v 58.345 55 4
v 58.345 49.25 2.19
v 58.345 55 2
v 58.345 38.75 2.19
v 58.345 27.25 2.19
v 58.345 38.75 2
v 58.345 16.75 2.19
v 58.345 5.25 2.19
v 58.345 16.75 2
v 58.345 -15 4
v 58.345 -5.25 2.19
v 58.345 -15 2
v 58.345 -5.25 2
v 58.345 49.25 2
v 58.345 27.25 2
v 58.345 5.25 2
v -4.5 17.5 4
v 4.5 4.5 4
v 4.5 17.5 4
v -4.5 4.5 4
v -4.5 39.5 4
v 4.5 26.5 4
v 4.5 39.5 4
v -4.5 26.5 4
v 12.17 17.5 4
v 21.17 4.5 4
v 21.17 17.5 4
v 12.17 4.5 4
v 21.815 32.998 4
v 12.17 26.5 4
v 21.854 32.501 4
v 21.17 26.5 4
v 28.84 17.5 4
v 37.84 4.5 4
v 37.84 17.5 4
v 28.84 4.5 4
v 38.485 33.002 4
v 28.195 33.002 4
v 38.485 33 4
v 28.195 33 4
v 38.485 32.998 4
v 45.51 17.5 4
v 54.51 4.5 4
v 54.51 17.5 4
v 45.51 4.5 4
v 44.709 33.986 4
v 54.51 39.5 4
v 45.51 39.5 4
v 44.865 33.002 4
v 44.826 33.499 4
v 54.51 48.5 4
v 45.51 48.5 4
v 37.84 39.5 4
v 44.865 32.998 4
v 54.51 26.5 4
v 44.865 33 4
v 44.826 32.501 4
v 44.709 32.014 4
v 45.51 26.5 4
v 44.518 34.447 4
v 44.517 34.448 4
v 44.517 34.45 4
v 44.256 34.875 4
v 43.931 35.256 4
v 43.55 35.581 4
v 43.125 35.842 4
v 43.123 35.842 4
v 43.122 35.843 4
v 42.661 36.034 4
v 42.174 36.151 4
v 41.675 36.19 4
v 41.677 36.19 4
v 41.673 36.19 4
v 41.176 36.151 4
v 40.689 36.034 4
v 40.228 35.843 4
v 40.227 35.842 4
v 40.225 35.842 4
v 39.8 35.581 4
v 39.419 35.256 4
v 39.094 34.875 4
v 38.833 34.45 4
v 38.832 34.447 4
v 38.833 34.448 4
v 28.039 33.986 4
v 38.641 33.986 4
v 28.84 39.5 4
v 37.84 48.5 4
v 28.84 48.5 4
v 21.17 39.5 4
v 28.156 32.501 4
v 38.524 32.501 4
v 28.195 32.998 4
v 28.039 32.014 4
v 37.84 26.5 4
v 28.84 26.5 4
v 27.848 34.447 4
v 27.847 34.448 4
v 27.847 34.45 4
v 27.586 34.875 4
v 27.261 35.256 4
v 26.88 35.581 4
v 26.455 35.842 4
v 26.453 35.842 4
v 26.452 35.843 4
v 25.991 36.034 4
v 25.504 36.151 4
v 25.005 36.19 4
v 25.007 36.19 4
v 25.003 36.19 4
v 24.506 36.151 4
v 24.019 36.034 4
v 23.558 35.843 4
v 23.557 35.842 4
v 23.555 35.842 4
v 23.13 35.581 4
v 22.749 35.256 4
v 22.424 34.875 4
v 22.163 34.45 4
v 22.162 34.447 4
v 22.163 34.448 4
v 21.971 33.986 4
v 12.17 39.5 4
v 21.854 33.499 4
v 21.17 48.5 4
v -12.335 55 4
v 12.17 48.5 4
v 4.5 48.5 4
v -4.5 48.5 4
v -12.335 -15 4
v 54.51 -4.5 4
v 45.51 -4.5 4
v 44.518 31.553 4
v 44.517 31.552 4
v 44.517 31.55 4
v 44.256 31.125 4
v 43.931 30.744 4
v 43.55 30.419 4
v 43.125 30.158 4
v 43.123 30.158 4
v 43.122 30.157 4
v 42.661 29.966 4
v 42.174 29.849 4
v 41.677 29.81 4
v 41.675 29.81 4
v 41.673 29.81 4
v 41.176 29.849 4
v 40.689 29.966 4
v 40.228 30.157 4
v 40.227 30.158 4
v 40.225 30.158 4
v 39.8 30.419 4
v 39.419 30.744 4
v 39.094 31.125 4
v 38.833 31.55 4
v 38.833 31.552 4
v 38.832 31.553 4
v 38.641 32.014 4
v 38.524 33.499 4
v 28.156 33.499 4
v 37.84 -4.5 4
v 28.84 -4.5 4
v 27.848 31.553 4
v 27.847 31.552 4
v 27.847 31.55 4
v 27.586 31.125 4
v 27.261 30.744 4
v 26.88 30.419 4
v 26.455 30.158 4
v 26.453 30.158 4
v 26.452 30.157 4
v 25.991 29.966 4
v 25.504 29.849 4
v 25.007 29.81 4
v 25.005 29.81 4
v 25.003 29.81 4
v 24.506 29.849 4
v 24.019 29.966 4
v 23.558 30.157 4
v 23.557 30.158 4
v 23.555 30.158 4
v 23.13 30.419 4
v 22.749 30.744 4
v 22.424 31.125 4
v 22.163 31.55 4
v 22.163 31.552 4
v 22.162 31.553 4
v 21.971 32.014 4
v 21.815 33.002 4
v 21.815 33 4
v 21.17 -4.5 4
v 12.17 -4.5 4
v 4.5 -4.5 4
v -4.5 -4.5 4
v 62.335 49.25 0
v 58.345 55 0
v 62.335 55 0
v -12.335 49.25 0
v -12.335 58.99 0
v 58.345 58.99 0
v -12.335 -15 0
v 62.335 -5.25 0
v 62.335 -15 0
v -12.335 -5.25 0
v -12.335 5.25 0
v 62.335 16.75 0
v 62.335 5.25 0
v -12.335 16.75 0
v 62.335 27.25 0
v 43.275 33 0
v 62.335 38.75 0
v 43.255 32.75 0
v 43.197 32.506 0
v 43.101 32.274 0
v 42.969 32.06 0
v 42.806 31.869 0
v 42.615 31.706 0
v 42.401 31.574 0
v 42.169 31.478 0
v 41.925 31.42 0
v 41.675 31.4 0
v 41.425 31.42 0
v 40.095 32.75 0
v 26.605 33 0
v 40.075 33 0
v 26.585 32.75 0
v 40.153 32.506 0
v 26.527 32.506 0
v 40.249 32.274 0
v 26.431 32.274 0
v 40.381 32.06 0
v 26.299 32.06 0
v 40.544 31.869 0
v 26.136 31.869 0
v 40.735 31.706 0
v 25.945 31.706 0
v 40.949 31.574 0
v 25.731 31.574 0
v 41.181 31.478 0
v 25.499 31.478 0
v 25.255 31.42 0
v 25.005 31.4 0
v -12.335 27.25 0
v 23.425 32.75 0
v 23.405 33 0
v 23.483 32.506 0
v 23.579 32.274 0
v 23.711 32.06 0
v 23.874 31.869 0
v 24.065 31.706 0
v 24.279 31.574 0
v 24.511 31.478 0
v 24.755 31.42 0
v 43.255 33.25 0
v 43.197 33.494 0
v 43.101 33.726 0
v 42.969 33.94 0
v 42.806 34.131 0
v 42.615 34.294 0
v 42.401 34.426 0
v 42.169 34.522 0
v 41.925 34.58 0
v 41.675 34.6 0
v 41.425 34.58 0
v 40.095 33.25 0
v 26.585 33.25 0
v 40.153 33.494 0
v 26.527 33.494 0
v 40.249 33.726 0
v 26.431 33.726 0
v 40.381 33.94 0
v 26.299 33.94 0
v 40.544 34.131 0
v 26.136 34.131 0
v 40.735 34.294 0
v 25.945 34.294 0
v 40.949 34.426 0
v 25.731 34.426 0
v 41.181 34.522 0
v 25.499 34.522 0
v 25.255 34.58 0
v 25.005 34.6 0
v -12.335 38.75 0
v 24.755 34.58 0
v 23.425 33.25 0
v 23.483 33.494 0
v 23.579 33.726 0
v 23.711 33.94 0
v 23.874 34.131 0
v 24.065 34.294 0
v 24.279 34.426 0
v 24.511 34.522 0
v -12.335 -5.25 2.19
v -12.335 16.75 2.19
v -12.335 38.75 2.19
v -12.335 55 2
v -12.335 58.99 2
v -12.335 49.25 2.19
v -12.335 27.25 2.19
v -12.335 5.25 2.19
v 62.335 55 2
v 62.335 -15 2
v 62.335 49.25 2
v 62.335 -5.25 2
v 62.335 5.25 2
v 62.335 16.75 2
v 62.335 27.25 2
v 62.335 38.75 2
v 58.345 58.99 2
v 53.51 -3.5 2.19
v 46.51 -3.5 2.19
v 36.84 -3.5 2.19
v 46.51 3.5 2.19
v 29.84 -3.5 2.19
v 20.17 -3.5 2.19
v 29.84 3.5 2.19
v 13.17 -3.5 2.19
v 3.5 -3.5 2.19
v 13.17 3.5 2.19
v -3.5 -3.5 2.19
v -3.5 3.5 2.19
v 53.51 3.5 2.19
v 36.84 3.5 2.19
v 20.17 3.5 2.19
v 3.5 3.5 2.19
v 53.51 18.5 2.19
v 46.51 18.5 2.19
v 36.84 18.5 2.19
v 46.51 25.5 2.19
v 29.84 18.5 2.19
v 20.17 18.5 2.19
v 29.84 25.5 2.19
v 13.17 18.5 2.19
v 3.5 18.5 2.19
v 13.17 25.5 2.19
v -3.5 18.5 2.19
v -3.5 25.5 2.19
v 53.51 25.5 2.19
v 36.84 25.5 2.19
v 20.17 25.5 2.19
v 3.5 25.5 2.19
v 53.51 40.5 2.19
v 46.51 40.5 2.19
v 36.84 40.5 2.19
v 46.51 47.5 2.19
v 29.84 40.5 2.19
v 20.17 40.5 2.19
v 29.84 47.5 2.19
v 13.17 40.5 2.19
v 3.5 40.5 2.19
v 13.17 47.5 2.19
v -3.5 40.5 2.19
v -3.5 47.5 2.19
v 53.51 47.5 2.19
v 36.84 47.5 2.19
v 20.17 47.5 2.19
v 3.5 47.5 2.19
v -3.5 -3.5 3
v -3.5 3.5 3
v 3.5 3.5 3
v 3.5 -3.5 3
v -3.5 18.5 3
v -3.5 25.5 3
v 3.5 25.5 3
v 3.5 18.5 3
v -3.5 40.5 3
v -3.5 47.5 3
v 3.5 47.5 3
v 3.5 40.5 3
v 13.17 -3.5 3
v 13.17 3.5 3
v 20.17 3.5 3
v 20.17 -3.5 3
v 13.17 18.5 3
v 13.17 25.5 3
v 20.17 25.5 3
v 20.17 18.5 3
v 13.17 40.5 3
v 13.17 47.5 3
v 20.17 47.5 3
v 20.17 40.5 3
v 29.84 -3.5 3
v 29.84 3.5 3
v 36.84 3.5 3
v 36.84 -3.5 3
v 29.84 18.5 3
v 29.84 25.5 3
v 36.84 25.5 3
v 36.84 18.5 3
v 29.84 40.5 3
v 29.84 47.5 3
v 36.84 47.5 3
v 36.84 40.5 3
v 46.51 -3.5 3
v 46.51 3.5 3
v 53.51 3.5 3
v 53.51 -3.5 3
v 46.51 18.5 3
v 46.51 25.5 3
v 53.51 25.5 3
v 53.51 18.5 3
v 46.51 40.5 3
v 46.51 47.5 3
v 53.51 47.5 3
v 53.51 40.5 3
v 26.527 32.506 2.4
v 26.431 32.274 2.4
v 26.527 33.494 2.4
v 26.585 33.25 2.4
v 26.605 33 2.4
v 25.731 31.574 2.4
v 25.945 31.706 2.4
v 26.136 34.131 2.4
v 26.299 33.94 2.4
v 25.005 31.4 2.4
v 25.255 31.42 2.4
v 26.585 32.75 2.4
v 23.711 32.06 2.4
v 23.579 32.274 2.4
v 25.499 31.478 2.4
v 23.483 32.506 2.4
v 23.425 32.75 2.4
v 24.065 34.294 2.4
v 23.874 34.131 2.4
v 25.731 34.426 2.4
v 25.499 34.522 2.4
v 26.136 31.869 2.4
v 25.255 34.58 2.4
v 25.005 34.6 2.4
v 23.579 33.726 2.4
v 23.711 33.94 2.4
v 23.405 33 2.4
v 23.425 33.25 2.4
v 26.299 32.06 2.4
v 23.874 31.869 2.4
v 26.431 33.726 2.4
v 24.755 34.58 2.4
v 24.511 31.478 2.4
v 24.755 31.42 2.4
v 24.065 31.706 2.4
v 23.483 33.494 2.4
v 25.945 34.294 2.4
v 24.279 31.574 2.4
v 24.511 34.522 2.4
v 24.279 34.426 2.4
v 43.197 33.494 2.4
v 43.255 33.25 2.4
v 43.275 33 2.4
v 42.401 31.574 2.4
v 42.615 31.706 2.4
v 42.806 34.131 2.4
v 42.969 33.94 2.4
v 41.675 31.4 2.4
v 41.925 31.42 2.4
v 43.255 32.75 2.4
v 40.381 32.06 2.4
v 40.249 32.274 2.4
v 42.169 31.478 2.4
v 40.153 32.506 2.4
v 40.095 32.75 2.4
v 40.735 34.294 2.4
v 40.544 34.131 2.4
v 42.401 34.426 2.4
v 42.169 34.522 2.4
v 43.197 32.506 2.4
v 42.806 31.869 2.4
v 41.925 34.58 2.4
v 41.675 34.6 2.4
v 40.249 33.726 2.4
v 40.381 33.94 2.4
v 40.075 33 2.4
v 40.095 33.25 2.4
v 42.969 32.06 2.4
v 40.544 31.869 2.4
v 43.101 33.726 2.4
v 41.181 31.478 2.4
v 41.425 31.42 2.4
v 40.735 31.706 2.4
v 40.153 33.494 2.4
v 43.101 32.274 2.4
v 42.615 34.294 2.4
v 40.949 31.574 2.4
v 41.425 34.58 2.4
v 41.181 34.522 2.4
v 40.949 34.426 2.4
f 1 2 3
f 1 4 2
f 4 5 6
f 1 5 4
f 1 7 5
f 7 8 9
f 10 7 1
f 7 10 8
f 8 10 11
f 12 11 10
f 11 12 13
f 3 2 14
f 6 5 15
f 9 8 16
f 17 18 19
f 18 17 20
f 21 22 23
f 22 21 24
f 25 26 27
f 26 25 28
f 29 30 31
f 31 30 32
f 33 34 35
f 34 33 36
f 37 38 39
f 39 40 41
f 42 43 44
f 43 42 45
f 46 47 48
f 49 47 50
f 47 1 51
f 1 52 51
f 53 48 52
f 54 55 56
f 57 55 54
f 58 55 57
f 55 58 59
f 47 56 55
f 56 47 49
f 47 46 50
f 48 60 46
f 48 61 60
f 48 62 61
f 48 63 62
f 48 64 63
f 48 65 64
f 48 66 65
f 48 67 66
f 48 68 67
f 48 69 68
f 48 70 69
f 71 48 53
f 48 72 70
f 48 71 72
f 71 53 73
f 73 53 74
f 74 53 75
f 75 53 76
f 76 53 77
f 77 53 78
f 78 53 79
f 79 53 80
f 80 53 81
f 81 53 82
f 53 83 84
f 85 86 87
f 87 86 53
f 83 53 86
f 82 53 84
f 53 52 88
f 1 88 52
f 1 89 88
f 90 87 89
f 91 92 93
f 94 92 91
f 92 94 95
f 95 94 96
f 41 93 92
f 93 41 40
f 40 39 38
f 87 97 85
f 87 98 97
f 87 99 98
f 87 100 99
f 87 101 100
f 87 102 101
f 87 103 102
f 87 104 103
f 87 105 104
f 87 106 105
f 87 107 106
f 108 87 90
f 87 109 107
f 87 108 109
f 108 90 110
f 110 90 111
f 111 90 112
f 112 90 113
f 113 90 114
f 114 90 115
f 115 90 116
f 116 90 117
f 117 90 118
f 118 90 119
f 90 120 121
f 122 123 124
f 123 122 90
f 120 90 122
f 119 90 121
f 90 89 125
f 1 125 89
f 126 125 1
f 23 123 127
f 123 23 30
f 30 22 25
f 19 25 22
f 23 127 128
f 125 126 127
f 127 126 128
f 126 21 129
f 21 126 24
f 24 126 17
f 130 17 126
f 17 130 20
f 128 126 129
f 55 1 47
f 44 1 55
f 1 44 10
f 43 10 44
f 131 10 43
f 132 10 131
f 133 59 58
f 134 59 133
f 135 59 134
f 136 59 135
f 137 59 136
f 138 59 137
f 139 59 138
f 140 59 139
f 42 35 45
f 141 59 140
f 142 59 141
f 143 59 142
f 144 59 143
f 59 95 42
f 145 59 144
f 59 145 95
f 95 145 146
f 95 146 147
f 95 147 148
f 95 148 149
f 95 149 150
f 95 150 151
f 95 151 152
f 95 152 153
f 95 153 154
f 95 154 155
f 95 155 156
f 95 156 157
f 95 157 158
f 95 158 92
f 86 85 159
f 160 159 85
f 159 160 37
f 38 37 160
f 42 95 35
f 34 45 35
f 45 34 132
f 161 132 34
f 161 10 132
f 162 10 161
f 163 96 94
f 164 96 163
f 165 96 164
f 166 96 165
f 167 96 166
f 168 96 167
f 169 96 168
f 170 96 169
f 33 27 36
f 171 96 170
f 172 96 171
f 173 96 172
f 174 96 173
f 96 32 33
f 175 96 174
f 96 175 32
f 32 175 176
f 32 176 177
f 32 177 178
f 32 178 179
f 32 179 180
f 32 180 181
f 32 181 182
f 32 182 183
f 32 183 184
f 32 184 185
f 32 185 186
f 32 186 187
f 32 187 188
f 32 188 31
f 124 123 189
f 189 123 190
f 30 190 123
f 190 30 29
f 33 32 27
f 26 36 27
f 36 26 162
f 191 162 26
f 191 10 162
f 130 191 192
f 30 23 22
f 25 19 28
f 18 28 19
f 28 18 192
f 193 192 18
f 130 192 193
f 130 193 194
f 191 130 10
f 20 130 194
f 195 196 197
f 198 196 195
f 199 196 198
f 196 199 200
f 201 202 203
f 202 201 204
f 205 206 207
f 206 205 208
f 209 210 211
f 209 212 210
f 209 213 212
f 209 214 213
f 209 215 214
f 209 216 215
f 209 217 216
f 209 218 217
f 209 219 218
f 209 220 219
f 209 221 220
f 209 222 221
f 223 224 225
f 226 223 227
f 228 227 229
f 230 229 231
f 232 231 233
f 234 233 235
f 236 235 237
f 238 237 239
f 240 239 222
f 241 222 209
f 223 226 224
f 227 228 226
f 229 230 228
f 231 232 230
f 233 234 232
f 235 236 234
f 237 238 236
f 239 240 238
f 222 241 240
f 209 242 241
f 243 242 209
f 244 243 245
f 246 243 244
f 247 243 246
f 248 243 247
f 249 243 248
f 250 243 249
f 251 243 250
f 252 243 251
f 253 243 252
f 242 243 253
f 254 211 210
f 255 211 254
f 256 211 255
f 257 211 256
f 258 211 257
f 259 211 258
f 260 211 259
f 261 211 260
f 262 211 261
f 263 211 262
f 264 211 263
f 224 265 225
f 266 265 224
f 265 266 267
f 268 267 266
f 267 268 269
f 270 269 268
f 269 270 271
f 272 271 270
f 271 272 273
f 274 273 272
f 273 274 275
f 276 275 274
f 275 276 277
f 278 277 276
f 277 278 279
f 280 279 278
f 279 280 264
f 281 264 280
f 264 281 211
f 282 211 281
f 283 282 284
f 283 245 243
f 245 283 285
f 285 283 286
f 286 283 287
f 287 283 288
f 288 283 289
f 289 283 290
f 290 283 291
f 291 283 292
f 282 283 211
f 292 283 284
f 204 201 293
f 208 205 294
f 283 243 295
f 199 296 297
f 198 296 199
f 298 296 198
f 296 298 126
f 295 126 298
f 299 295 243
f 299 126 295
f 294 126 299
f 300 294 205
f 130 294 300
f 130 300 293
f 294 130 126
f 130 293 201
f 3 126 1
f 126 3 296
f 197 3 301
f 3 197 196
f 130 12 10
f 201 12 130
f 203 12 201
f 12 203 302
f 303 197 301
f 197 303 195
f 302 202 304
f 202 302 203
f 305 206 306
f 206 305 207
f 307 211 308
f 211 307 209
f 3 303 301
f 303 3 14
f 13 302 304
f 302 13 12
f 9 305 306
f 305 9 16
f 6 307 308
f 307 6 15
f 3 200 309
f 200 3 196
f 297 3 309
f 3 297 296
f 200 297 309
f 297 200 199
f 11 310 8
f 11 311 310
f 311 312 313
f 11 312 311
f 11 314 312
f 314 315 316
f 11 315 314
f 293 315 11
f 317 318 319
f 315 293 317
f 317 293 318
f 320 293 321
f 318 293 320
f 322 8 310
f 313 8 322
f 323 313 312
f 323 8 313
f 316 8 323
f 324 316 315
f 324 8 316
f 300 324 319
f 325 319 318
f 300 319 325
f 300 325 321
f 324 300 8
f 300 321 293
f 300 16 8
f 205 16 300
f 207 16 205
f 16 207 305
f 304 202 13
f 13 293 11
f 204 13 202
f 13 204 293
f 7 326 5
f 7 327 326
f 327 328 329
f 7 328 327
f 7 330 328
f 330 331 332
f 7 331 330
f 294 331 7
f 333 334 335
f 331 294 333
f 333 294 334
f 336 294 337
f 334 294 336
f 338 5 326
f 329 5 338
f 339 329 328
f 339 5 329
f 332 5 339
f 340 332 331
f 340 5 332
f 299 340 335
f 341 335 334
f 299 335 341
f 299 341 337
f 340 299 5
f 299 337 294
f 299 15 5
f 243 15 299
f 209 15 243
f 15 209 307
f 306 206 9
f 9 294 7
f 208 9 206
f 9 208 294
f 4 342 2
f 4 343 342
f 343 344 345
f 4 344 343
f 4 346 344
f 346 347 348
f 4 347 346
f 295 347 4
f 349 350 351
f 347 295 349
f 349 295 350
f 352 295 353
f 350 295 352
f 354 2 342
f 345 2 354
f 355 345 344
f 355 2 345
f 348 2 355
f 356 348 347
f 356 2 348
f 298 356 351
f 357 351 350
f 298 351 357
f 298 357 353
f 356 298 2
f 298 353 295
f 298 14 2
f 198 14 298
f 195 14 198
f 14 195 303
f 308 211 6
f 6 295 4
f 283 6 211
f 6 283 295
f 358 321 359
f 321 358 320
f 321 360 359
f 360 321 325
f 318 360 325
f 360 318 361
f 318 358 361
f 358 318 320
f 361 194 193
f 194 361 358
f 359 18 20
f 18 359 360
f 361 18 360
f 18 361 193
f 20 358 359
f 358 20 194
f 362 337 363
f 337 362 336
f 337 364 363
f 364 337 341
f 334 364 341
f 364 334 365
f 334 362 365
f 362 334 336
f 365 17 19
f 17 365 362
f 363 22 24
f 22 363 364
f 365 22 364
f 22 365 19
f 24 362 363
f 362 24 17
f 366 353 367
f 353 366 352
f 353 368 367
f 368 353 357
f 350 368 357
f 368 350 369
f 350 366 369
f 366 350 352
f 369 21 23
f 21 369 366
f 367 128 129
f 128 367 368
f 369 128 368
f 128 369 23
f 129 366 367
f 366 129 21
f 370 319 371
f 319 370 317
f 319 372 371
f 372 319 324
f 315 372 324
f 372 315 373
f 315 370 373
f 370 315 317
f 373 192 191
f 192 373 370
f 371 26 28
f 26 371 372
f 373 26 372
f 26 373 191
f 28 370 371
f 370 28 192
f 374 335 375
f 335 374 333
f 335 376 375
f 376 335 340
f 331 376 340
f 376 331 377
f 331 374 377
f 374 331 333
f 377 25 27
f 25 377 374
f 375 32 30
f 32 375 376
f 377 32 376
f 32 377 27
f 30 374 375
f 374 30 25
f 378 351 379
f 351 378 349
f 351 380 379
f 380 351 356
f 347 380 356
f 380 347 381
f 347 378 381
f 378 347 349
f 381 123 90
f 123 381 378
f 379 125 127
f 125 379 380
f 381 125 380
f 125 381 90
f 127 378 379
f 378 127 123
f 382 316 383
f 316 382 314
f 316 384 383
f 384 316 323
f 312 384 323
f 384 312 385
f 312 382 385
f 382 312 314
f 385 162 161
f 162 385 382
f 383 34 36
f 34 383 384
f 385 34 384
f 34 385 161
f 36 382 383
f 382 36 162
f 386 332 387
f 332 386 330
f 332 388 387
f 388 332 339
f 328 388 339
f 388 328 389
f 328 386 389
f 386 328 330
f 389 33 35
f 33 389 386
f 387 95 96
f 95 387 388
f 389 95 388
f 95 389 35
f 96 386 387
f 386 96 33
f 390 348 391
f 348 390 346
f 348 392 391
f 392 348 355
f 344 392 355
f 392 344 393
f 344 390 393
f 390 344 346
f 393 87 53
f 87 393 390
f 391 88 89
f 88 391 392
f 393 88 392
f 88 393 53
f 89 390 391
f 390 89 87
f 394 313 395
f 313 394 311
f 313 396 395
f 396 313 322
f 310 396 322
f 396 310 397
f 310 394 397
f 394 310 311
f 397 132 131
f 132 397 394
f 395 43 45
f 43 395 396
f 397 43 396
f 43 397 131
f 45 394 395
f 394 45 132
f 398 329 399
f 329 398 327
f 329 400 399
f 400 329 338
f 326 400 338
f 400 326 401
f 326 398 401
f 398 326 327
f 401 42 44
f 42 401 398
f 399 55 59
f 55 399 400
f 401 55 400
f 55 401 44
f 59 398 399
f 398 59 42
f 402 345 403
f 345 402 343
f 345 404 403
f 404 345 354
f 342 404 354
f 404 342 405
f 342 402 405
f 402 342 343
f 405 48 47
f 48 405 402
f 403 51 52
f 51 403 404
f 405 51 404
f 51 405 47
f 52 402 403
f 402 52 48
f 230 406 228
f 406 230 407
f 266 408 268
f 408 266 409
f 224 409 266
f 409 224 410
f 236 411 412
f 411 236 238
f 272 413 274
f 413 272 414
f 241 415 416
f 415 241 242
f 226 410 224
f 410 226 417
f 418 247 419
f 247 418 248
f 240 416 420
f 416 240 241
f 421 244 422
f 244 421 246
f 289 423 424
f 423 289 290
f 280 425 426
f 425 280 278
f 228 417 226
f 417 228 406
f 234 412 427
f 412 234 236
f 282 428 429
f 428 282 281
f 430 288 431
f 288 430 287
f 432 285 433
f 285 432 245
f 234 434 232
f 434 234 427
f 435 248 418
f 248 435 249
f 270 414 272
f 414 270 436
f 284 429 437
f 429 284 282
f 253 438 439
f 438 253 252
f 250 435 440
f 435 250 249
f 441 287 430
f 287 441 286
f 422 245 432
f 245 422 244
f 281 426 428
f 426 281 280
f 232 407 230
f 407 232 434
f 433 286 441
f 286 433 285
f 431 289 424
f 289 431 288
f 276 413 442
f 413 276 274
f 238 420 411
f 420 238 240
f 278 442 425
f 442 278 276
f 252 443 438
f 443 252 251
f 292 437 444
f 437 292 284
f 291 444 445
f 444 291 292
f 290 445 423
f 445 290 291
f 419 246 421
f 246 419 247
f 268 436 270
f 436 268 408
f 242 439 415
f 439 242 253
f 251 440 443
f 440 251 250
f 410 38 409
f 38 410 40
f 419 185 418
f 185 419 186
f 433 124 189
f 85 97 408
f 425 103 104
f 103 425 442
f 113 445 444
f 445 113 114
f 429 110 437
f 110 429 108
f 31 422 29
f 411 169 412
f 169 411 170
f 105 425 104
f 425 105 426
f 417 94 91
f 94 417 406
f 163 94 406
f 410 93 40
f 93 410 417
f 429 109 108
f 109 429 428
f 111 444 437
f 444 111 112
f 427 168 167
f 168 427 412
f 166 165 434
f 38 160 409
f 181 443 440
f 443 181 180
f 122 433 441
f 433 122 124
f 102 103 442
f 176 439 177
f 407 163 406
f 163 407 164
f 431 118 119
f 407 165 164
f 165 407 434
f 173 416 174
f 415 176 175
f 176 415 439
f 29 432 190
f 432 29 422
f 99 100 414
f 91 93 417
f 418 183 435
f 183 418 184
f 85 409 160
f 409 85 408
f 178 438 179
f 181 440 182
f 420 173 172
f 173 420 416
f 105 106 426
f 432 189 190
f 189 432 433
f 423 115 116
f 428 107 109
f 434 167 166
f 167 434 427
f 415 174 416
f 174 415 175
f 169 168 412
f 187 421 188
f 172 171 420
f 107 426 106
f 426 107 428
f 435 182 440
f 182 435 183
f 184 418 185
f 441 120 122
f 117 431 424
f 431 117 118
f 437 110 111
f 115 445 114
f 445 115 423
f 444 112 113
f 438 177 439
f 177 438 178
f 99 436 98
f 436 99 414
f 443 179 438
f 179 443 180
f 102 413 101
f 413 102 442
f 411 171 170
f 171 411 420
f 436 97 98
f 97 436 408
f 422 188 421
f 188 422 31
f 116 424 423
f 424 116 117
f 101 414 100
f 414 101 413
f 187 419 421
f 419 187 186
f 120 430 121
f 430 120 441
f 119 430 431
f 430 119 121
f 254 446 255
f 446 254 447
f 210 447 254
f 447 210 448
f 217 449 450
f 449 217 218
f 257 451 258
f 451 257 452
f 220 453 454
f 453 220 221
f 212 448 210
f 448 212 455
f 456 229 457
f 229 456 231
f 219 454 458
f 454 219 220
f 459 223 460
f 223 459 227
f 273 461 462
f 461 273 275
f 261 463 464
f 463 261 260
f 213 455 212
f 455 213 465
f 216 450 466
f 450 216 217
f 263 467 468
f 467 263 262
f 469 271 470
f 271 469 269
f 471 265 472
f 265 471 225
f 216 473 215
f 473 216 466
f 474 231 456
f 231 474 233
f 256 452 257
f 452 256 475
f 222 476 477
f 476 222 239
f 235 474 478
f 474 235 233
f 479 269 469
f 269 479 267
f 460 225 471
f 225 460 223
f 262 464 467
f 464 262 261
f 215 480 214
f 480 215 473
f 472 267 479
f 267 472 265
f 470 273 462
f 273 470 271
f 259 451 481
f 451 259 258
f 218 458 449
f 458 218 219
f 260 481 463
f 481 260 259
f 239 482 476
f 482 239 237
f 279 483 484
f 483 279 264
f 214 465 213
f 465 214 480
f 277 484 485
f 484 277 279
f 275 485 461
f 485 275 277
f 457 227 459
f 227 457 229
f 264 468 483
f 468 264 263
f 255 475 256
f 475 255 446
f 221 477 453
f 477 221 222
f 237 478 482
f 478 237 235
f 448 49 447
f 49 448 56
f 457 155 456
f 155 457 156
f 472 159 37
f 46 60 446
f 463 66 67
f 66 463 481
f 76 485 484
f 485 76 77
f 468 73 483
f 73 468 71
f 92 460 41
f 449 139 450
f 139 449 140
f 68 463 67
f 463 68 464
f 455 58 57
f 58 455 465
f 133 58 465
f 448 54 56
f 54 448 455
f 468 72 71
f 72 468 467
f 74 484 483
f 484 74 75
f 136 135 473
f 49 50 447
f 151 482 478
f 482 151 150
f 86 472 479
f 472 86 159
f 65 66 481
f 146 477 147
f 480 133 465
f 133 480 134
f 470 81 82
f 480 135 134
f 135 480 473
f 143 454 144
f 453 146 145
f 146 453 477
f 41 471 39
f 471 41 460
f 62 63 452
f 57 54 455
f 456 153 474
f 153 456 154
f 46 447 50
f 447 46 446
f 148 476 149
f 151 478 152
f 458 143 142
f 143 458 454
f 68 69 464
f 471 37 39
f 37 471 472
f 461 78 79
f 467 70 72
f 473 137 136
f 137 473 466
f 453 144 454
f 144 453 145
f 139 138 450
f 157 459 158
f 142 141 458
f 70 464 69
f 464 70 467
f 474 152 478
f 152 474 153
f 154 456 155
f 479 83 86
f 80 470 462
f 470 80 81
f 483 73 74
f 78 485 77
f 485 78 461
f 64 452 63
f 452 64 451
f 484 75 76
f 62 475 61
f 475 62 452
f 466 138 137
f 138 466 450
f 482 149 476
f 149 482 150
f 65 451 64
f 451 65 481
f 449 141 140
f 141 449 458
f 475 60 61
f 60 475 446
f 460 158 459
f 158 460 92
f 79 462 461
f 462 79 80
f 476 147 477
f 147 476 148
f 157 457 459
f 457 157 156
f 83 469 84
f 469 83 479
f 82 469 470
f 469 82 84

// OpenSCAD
// ============================================================================
//  PANEL 23 x 12 - piezas imprimibles
//
//    rejilla     tapa todas las tiras y deja a la vista SOLO los LED.
//                Sale en 4 modulos que se encastran a media madera.
//    zocalo      perfil en C que abraza el canto de la placa y tapa los cables
//                verde / rojo / negro de los costados.
//    pasacable   omega recta: los cables por adentro, las aletas se pegan.
//    caja        caja con tapa para la electronica (placa perforada + Nano).
//    gancho      soporte superior: cuelga de un alambre de la reja.
//    traba       soporte inferior: separa de la reja y se ata con precinto.
//
//  LAS MEDIDAS SALEN DE FOTOS CON CINTA: son aproximadas. Las cuatro que
//  importan estan marcadas con  <<< MEDIR.  Antes de imprimir los 4 modulos,
//  imprimi  PIEZA = "prueba"  (una esquina de 4 x 3 LED, 10 minutos) y apoyala
//  sobre el panel.
// ============================================================================

PIEZA = "prueba";
// "prueba" | "rejilla_1" | "rejilla_2" | "rejilla_3" | "rejilla_4"
// "zocalo" | "pasacable" | "caja" | "caja_tapa" | "gancho" | "traba" | "vista"
//
//   Vista de frente:      rejilla_3 | rejilla_4      (fila de arriba)
//                         rejilla_1 | rejilla_2      (fila de abajo)

/* ---------------- el panel ---------------- */
COLS   = 23;
FILAS  = 12;
PASO_X = 16.67;  // <<< MEDIR: entre centros de LED en la tira (60 LED/m = 16,67)
PASO_Y = 22.0;   // <<< MEDIR: entre centros de dos tiras vecinas
TIRA_ANCHO = 10.5;   // ancho de la tira, con un poco de juego
TIRA_ALTO  = 2.2;    // lo que levanta la tira con sus componentes (sin el LED)

/* ---------------- la rejilla ---------------- */
VENTANA   = 7.0;   // lado del agujero de cada LED (el LED mide 5 x 5)
REJ_ALTO  = 4.0;   // espesor total. Mas alto = mas contraste al sol y menos
                   // angulo de vision. 4 mm deja el LED 1,5 mm hundido.
BISEL     = 1.0;   // la ventana se abre hacia el frente (mejora el angulo). 0 = recta
BORDE     = 4.0;   // cuanto sobra por fuera del ultimo LED
SOLAPA    = 4.0;   // ancho del encastre entre modulos
JUEGO     = 0.25;  // holgura del encastre
COLS_IZQ  = 12;    // columnas de los modulos de la izquierda (los otros: el resto)
FILAS_ABA = 6;     // filas de los modulos de abajo
TORNILLO  = 3.2;   // agujero para fijar a la placa (0 = sin agujeros, se pega)

/* ---------------- el zocalo ---------------- */
PLACA_ESP  = 5.0;  // <<< MEDIR: espesor de la placa negra de fondo
ZOC_FRENTE = 9.0;  // <<< MEDIR: cuanto tapa por el frente, desde el canto.
                   //     Tiene que cubrir las soldaduras SIN llegar al primer LED
ZOC_DETRAS = 15;   // cuanto tapa por detras
ZOC_CABLE  = 5.0;  // lugar libre para los cables (frente, canto y detras)
ZOC_PARED  = 1.6;
ZOC_LARGO  = 132;  // largo de cada tramo: 2 tramos por lateral
ZOC_PIE_0  = 11;   // <<< MEDIR: del extremo del tramo al primer hueco ENTRE dos
                   //     tiras. Ahi van los pies que aprietan la placa (cada
                   //     PASO_Y), para no pisar tiras ni cables.

/* ---------------- el pasacable ---------------- */
PC_ANCHO = 9;      // hueco interior (ancho)
PC_ALTO  = 6;      // hueco interior (alto)
PC_ALETA = 9;      // ancho de cada aleta de pegado
PC_LARGO = 25;
PC_PARED = 1.6;

/* ---------------- la caja de la electronica ---------------- */
PCB_L = 70;        // <<< MEDIR: largo de la placa perforada
PCB_A = 50;        //            ancho
CAJA_ALTO  = 30;   // alto libre interior (el capacitor de 2200 uF va acostado)
CAJA_PARED = 2.0;
CAJA_JUEGO = 1.5;  // aire alrededor de la placa
CAJA_APOYO = 4;    // altura de los apoyos de la placa (lugar para soldaduras)
SALIDA_ANCHO = 14; // ranuras para cables en los dos extremos cortos
SALIDA_ALTO  = 9;
USB_ANCHO  = 13;   // ranura para el cable USB en un lateral largo (0 = sin)
OREJA      = 12;   // aletas para pegar o atornillar la caja al panel

/* ---------------- el soporte para la reja ---------------- */
ALAMBRE     = 5.0; // diametro del alambre de la reja, con su recubrimiento
SOP_ANCHO   = 30;
SOP_ESP     = 4.5; // espesor del plastico
SOP_ALTO    = 60;  // alto de la placa que va contra el panel
GANCHO_BAJA = 18;  // cuanto baja el pico por detras del alambre
PRECINTO    = 5.0; // ancho del precinto que pasa por la traba

$fn = 40;

/* ============================== REJILLA ==============================
   Origen en el centro del LED de abajo a la izquierda. Las tiras corren en X.
   z = 0 es la cara que apoya en la placa.                                  */
function rx0(c0)     = c0 == 0     ? -PASO_X/2 - BORDE : (c0 - 0.5)*PASO_X;
function rx1(c1)     = c1 == COLS  ? (COLS - 0.5)*PASO_X + BORDE : (c1 - 0.5)*PASO_X;
function ry0(f0)     = f0 == 0     ? -PASO_Y/2 - BORDE : (f0 - 0.5)*PASO_Y;
function ry1(f1)     = f1 == FILAS ? (FILAS - 0.5)*PASO_Y + BORDE : (f1 - 0.5)*PASO_Y;

// modulo que cubre las columnas c0..c1-1 y las filas f0..f1-1
module rejilla(c0, c1, f0, f1){
  xa = rx0(c0); xb = rx1(c1); ya = ry0(f0); yb = ry1(f1);
  h2 = REJ_ALTO/2;
  difference(){
    union(){
      translate([xa, ya, 0]) cube([xb - xa, yb - ya, REJ_ALTO]);
      // lengueta inferior hacia la DERECHA y hacia ARRIBA, si hay vecino
      if(c1 < COLS)  translate([xb - 0.01, ya, 0]) cube([SOLAPA, yb - ya, h2]);
      if(f1 < FILAS) translate([xa, yb - 0.01, 0]) cube([xb - xa, SOLAPA, h2]);
    }
    // rebaje inferior a la IZQUIERDA y ABAJO, donde entra la lengueta del vecino
    if(c0 > 0) translate([xa - 0.01, ya - SOLAPA - 1, -0.01])
      cube([SOLAPA + JUEGO, yb - ya + 2*SOLAPA + 2, h2 + JUEGO]);
    if(f0 > 0) translate([xa - SOLAPA - 1, ya - 0.01, -0.01])
      cube([xb - xa + 2*SOLAPA + 2, SOLAPA + JUEGO, h2 + JUEGO]);
    // canal de cada tira, por debajo
    for(f = [f0 : f1 - 1]) translate([xa - SOLAPA - 2, f*PASO_Y - TIRA_ANCHO/2, -0.01])
      cube([xb - xa + 2*SOLAPA + 4, TIRA_ANCHO, TIRA_ALTO]);
    // ventana de cada LED
    for(c = [c0 : c1 - 1], f = [f0 : f1 - 1]) translate([c*PASO_X, f*PASO_Y, 0]) ventana();
    // agujeros de fijacion: en el macizo entre tiras y entre columnas
    if(TORNILLO > 0)
      for(c = [c0 + 1, c1 - 2], f = [f0 + 1, f1 - 2])
        translate([(c + 0.5)*PASO_X, (f + 0.5)*PASO_Y, -1]){
          cylinder(d = TORNILLO, h = REJ_ALTO + 2);
          translate([0, 0, 1 + REJ_ALTO - 1.6]) cylinder(d1 = TORNILLO, d2 = TORNILLO + 3.2, h = 1.61);
        }
  }
}
module ventana(){
  translate([0, 0, -1]) linear_extrude(REJ_ALTO + 2) square(VENTANA, center = true);
  if(BISEL > 0) hull(){
    translate([0, 0, REJ_ALTO - BISEL]) linear_extrude(0.01) square(VENTANA, center = true);
    translate([0, 0, REJ_ALTO]) linear_extrude(0.01) square(VENTANA + 2*BISEL, center = true);
  }
}
module rejilla_n(n){
  if(n == 1) rejilla(0, COLS_IZQ, 0, FILAS_ABA);
  if(n == 2) rejilla(COLS_IZQ, COLS, 0, FILAS_ABA);
  if(n == 3) rejilla(0, COLS_IZQ, FILAS_ABA, FILAS);
  if(n == 4) rejilla(COLS_IZQ, COLS, FILAS_ABA, FILAS);
}

/* ============================== ZOCALO ==============================
   Perfil en C. u = hacia adentro del panel desde el canto, v = hacia el frente.
   Se imprime parado sobre el perfil (sin soporte) o acostado sobre el lomo. */
module zocalo2d(){
  p = ZOC_PARED; c = ZOC_CABLE; e = PLACA_ESP;
  difference(){
    union(){
      translate([-c - p, -e/2]) square([c + p + ZOC_FRENTE, e/2 + c + p]);        // frente
      translate([-c - p, -e - c - p]) square([c + p + ZOC_DETRAS, e/2 + c + p]);  // detras
    }
    translate([-c, 0])      square([c + ZOC_FRENTE + 1, c]);          // cables del frente
    translate([-c, -e - c]) square([c + ZOC_DETRAS + 1, c]);          // cables de atras
    translate([-c, -e - c]) square([c, e + 2*c]);                     // cables del canto
    translate([-0.2, -e - 0.2]) square([ZOC_DETRAS + ZOC_FRENTE, e + 0.4]);  // la placa
  }
}
// pie que baja desde la pared hasta tocar la placa, con rampa para imprimir
module zocalo_pie(frente){
  c = ZOC_CABLE; e = PLACA_ESP; L = frente ? ZOC_FRENTE : ZOC_DETRAS;
  hull(){
    translate([L - 3, frente ? 0.2 : -e - c, 0]) cube([3, c - 0.2 + 0.01, 5]);
    translate([L - 3, frente ? c - 0.01 : -e - c - 0.01, -c]) cube([3, 0.02, 0.1]);
  }
}
module zocalo(){
  linear_extrude(ZOC_LARGO) zocalo2d();
  for(z = [ZOC_PIE_0 : PASO_Y : ZOC_LARGO - 6]) translate([0, 0, z - 2.5]){
    zocalo_pie(true);
    zocalo_pie(false);
  }
}

/* ============================== PASACABLE ============================== */
module pasacable2d(){
  p = PC_PARED;
  difference(){
    union(){
      translate([-PC_ANCHO/2 - p, 0]) square([PC_ANCHO + 2*p, PC_ALTO + p]);
      translate([-PC_ANCHO/2 - p - PC_ALETA, 0]) square([PC_ANCHO + 2*p + 2*PC_ALETA, p]);
    }
    translate([-PC_ANCHO/2, -0.01]) square([PC_ANCHO, PC_ALTO]);
  }
}
// se imprime parado sobre el perfil: sin puentes ni soportes
module pasacable(){ linear_extrude(PC_LARGO) pasacable2d(); }

/* ============================== CAJA ==============================
   Origen en la esquina interior. La placa apoya en 4 escuadras; la tapa la
   sujeta por arriba con 4 tornillos M3 x 10 en los postes de las esquinas. */
ci_l = PCB_L + 2*CAJA_JUEGO;                // interior
ci_a = PCB_A + 2*CAJA_JUEGO;
ce_l = ci_l + 2*CAJA_PARED;                 // exterior
ce_a = ci_a + 2*CAJA_PARED;
c_h  = CAJA_PARED + CAJA_ALTO;              // alto de la base (sin tapa)
POSTE = 8;                                  // diametro de los postes de tornillo
function postes() = [ for(x = [-CAJA_PARED - 1, ci_l + CAJA_PARED + 1],
                          y = [-CAJA_PARED - 1, ci_a + CAJA_PARED + 1]) [x, y] ];

module caja_contorno2d(){
  translate([-CAJA_PARED, -CAJA_PARED]) square([ce_l, ce_a]);
  for(p = postes()) translate(p) circle(d = POSTE);
}
module caja(){
  difference(){
    union(){
      linear_extrude(c_h) caja_contorno2d();
      // aletas para fijar la caja
      if(OREJA > 0) for(s = [0, 1]) translate([ci_l/2 - 12, s ? ci_a + CAJA_PARED : -CAJA_PARED - OREJA, 0])
        difference(){
          cube([24, OREJA, 3]);
          translate([12, OREJA/2 + (s ? 2 : -2), -1]) cylinder(d = 4, h = 5);
        }
    }
    // el hueco
    translate([0, 0, CAJA_PARED]) cube([ci_l, ci_a, c_h]);
    // tornillos de la tapa
    for(p = postes()) translate([p.x, p.y, c_h - 14]) cylinder(d = 2.6, h = 15);
    // salidas de cables, abiertas hacia la tapa
    for(x = [-CAJA_PARED - POSTE, ci_l - 1])
      translate([x, ci_a/2 - SALIDA_ANCHO/2, c_h - SALIDA_ALTO]) cube([CAJA_PARED + POSTE + 1, SALIDA_ANCHO, SALIDA_ALTO + 1]);
    if(USB_ANCHO > 0)
      translate([ci_l/2 - USB_ANCHO/2, -CAJA_PARED - POSTE, c_h - SALIDA_ALTO]) cube([USB_ANCHO, CAJA_PARED + POSTE + 1, SALIDA_ALTO + 1]);
    // ventilacion en el piso
    for(i = [0 : 4]) translate([ci_l/2 - 20 + i*10 - 1.5, ci_a/2 - 12, -1]) cube([3, 24, CAJA_PARED + 2]);
  }
  // escuadras donde apoya la placa
  for(x = [0, ci_l - 6], y = [0, ci_a - 6])
    translate([x, y, CAJA_PARED - 0.01]) cube([6, 6, CAJA_APOYO]);
}
module caja_tapa(){
  difference(){
    union(){
      linear_extrude(CAJA_PARED) caja_contorno2d();
      // labio que centra la tapa
      translate([0, 0, CAJA_PARED - 0.01]) difference(){
        translate([0.3, 0.3, 0]) cube([ci_l - 0.6, ci_a - 0.6, 2]);
        translate([1.8, 1.8, -1]) cube([ci_l - 3.6, ci_a - 3.6, 4]);
      }
    }
    for(p = postes()) translate([p.x, p.y, -1]){
      cylinder(d = 3.4, h = CAJA_PARED + 4);
      cylinder(d = 6.2, h = 1 + 1.2);                 // cabeza embutida
    }
  }
}

/* ============================== SOPORTE ==============================
   GANCHO: dos arriba, atornillados o pegados a la espalda del panel. El panel
   se cuelga de un alambre horizontal de la reja.
   TRABA: dos abajo. Separan el panel de la reja lo mismo que el gancho y se
   atan a un alambre con un precinto: con eso el gancho ya no puede salirse.
   Las dos se imprimen ACOSTADAS (el perfil sobre la cama): asi las capas
   corren a lo largo del gancho y no se parte por el tiron.               */
sep = ALAMBRE + 1.5;                         // boca del gancho
module gancho2d(){
  e = SOP_ESP;
  // placa contra el panel (x de 0 a e), brazo superior, y el pico que baja
  square([e, SOP_ALTO]);
  translate([0, SOP_ALTO - e]) square([2*e + sep, e]);
  translate([e + sep, SOP_ALTO - e - GANCHO_BAJA]) square([e, GANCHO_BAJA + e]);
  // refuerzo en el angulo
  translate([e, SOP_ALTO - e]) polygon([[0, 0], [0, -sep*0.6], [sep*0.6, 0]]);
}
module gancho(){
  difference(){
    linear_extrude(SOP_ANCHO) gancho2d();
    // dos tornillos hacia el panel, por debajo del pico
    for(y = [10, SOP_ALTO - GANCHO_BAJA - SOP_ESP - 12])
      translate([-1, y, SOP_ANCHO/2]) rotate([0, 90, 0]){
        cylinder(d = 4.2, h = SOP_ESP + 2);
        translate([0, 0, 1 + SOP_ESP - 2]) cylinder(d1 = 4.2, d2 = 8.4, h = 2.01);
      }
  }
}
module traba2d(){
  e = SOP_ESP;
  difference(){
    union(){
      square([e, 40]);                                   // placa contra el panel
      translate([0, 12]) square([2*e + sep, 16]);        // taco separador
    }
    // cuna donde apoya el alambre
    translate([2*e + sep, 20]) circle(d = ALAMBRE + 1);
  }
}
module traba(){
  difference(){
    linear_extrude(SOP_ANCHO) traba2d();
    // tunel vertical para el precinto: abraza el alambre que apoya en la cuna
    translate([SOP_ESP + 1.5, 11, SOP_ANCHO/2 - (PRECINTO + 1.5)/2]) cube([2.8, 18, PRECINTO + 1.5]);
    for(y = [6, 34]) translate([-1, y, SOP_ANCHO/2]) rotate([0, 90, 0]){
      cylinder(d = 4.2, h = SOP_ESP + 2);
      translate([0, 0, 1 + SOP_ESP - 2]) cylinder(d1 = 4.2, d2 = 8.4, h = 2.01);
    }
  }
}

/* ============================== SALIDA ============================== */
if(PIEZA == "prueba")    rejilla(0, 4, 0, 3);
if(PIEZA == "rejilla_1") rejilla_n(1);
if(PIEZA == "rejilla_2") rejilla_n(2);
if(PIEZA == "rejilla_3") rejilla_n(3);
if(PIEZA == "rejilla_4") rejilla_n(4);
if(PIEZA == "zocalo")    zocalo();
if(PIEZA == "pasacable") for(i = [0 : 2]) translate([i*(PC_ANCHO + 2*PC_ALETA + 2*PC_PARED + 4), 0, 0]) pasacable();
if(PIEZA == "caja")      caja();
if(PIEZA == "caja_tapa") caja_tapa();
if(PIEZA == "gancho")    gancho();
if(PIEZA == "traba")     traba();
if(PIEZA == "vista"){
  color("dimgray") for(n = [1 : 4]) rejilla_n(n);
}

echo(str("Panel de LEDs: ", COLS*PASO_X, " x ", FILAS*PASO_Y, " mm"));
echo(str("Modulo mas grande: ", COLS_IZQ*PASO_X + BORDE + SOLAPA, " x ",
         max(FILAS_ABA, FILAS - FILAS_ABA)*PASO_Y + BORDE + SOLAPA, " mm"));

// NOTAS DE IMPRESION
//  - REJILLA: PETG o ASA NEGRO MATE (el PLA se deforma al sol). Cara del frente
//    hacia ARRIBA, canales contra la cama. Capa 0,2 mm, sin soporte.
//    Cada modulo mide ~208 x 140 mm: entra en una cama de 220 x 220.
//    Se encastran: 1 y 3 tienen lengueta a la derecha, 1 y 2 hacia arriba.
//    Pegalas a la placa con cinta doble faz o silicona, o usa los 4 agujeros.
//  - ZOCALO: 2 tramos por lateral (4 en total), parado sobre el perfil. Entra
//    a presion por los pies; un punto de silicona lo deja fijo.
//  - CAJA: la placa apoya en las 4 escuadras; fijala con un punto de silicona.
//  - GANCHO y TRABA: PETG, 4 perimetros, 50 % de relleno, acostados.
